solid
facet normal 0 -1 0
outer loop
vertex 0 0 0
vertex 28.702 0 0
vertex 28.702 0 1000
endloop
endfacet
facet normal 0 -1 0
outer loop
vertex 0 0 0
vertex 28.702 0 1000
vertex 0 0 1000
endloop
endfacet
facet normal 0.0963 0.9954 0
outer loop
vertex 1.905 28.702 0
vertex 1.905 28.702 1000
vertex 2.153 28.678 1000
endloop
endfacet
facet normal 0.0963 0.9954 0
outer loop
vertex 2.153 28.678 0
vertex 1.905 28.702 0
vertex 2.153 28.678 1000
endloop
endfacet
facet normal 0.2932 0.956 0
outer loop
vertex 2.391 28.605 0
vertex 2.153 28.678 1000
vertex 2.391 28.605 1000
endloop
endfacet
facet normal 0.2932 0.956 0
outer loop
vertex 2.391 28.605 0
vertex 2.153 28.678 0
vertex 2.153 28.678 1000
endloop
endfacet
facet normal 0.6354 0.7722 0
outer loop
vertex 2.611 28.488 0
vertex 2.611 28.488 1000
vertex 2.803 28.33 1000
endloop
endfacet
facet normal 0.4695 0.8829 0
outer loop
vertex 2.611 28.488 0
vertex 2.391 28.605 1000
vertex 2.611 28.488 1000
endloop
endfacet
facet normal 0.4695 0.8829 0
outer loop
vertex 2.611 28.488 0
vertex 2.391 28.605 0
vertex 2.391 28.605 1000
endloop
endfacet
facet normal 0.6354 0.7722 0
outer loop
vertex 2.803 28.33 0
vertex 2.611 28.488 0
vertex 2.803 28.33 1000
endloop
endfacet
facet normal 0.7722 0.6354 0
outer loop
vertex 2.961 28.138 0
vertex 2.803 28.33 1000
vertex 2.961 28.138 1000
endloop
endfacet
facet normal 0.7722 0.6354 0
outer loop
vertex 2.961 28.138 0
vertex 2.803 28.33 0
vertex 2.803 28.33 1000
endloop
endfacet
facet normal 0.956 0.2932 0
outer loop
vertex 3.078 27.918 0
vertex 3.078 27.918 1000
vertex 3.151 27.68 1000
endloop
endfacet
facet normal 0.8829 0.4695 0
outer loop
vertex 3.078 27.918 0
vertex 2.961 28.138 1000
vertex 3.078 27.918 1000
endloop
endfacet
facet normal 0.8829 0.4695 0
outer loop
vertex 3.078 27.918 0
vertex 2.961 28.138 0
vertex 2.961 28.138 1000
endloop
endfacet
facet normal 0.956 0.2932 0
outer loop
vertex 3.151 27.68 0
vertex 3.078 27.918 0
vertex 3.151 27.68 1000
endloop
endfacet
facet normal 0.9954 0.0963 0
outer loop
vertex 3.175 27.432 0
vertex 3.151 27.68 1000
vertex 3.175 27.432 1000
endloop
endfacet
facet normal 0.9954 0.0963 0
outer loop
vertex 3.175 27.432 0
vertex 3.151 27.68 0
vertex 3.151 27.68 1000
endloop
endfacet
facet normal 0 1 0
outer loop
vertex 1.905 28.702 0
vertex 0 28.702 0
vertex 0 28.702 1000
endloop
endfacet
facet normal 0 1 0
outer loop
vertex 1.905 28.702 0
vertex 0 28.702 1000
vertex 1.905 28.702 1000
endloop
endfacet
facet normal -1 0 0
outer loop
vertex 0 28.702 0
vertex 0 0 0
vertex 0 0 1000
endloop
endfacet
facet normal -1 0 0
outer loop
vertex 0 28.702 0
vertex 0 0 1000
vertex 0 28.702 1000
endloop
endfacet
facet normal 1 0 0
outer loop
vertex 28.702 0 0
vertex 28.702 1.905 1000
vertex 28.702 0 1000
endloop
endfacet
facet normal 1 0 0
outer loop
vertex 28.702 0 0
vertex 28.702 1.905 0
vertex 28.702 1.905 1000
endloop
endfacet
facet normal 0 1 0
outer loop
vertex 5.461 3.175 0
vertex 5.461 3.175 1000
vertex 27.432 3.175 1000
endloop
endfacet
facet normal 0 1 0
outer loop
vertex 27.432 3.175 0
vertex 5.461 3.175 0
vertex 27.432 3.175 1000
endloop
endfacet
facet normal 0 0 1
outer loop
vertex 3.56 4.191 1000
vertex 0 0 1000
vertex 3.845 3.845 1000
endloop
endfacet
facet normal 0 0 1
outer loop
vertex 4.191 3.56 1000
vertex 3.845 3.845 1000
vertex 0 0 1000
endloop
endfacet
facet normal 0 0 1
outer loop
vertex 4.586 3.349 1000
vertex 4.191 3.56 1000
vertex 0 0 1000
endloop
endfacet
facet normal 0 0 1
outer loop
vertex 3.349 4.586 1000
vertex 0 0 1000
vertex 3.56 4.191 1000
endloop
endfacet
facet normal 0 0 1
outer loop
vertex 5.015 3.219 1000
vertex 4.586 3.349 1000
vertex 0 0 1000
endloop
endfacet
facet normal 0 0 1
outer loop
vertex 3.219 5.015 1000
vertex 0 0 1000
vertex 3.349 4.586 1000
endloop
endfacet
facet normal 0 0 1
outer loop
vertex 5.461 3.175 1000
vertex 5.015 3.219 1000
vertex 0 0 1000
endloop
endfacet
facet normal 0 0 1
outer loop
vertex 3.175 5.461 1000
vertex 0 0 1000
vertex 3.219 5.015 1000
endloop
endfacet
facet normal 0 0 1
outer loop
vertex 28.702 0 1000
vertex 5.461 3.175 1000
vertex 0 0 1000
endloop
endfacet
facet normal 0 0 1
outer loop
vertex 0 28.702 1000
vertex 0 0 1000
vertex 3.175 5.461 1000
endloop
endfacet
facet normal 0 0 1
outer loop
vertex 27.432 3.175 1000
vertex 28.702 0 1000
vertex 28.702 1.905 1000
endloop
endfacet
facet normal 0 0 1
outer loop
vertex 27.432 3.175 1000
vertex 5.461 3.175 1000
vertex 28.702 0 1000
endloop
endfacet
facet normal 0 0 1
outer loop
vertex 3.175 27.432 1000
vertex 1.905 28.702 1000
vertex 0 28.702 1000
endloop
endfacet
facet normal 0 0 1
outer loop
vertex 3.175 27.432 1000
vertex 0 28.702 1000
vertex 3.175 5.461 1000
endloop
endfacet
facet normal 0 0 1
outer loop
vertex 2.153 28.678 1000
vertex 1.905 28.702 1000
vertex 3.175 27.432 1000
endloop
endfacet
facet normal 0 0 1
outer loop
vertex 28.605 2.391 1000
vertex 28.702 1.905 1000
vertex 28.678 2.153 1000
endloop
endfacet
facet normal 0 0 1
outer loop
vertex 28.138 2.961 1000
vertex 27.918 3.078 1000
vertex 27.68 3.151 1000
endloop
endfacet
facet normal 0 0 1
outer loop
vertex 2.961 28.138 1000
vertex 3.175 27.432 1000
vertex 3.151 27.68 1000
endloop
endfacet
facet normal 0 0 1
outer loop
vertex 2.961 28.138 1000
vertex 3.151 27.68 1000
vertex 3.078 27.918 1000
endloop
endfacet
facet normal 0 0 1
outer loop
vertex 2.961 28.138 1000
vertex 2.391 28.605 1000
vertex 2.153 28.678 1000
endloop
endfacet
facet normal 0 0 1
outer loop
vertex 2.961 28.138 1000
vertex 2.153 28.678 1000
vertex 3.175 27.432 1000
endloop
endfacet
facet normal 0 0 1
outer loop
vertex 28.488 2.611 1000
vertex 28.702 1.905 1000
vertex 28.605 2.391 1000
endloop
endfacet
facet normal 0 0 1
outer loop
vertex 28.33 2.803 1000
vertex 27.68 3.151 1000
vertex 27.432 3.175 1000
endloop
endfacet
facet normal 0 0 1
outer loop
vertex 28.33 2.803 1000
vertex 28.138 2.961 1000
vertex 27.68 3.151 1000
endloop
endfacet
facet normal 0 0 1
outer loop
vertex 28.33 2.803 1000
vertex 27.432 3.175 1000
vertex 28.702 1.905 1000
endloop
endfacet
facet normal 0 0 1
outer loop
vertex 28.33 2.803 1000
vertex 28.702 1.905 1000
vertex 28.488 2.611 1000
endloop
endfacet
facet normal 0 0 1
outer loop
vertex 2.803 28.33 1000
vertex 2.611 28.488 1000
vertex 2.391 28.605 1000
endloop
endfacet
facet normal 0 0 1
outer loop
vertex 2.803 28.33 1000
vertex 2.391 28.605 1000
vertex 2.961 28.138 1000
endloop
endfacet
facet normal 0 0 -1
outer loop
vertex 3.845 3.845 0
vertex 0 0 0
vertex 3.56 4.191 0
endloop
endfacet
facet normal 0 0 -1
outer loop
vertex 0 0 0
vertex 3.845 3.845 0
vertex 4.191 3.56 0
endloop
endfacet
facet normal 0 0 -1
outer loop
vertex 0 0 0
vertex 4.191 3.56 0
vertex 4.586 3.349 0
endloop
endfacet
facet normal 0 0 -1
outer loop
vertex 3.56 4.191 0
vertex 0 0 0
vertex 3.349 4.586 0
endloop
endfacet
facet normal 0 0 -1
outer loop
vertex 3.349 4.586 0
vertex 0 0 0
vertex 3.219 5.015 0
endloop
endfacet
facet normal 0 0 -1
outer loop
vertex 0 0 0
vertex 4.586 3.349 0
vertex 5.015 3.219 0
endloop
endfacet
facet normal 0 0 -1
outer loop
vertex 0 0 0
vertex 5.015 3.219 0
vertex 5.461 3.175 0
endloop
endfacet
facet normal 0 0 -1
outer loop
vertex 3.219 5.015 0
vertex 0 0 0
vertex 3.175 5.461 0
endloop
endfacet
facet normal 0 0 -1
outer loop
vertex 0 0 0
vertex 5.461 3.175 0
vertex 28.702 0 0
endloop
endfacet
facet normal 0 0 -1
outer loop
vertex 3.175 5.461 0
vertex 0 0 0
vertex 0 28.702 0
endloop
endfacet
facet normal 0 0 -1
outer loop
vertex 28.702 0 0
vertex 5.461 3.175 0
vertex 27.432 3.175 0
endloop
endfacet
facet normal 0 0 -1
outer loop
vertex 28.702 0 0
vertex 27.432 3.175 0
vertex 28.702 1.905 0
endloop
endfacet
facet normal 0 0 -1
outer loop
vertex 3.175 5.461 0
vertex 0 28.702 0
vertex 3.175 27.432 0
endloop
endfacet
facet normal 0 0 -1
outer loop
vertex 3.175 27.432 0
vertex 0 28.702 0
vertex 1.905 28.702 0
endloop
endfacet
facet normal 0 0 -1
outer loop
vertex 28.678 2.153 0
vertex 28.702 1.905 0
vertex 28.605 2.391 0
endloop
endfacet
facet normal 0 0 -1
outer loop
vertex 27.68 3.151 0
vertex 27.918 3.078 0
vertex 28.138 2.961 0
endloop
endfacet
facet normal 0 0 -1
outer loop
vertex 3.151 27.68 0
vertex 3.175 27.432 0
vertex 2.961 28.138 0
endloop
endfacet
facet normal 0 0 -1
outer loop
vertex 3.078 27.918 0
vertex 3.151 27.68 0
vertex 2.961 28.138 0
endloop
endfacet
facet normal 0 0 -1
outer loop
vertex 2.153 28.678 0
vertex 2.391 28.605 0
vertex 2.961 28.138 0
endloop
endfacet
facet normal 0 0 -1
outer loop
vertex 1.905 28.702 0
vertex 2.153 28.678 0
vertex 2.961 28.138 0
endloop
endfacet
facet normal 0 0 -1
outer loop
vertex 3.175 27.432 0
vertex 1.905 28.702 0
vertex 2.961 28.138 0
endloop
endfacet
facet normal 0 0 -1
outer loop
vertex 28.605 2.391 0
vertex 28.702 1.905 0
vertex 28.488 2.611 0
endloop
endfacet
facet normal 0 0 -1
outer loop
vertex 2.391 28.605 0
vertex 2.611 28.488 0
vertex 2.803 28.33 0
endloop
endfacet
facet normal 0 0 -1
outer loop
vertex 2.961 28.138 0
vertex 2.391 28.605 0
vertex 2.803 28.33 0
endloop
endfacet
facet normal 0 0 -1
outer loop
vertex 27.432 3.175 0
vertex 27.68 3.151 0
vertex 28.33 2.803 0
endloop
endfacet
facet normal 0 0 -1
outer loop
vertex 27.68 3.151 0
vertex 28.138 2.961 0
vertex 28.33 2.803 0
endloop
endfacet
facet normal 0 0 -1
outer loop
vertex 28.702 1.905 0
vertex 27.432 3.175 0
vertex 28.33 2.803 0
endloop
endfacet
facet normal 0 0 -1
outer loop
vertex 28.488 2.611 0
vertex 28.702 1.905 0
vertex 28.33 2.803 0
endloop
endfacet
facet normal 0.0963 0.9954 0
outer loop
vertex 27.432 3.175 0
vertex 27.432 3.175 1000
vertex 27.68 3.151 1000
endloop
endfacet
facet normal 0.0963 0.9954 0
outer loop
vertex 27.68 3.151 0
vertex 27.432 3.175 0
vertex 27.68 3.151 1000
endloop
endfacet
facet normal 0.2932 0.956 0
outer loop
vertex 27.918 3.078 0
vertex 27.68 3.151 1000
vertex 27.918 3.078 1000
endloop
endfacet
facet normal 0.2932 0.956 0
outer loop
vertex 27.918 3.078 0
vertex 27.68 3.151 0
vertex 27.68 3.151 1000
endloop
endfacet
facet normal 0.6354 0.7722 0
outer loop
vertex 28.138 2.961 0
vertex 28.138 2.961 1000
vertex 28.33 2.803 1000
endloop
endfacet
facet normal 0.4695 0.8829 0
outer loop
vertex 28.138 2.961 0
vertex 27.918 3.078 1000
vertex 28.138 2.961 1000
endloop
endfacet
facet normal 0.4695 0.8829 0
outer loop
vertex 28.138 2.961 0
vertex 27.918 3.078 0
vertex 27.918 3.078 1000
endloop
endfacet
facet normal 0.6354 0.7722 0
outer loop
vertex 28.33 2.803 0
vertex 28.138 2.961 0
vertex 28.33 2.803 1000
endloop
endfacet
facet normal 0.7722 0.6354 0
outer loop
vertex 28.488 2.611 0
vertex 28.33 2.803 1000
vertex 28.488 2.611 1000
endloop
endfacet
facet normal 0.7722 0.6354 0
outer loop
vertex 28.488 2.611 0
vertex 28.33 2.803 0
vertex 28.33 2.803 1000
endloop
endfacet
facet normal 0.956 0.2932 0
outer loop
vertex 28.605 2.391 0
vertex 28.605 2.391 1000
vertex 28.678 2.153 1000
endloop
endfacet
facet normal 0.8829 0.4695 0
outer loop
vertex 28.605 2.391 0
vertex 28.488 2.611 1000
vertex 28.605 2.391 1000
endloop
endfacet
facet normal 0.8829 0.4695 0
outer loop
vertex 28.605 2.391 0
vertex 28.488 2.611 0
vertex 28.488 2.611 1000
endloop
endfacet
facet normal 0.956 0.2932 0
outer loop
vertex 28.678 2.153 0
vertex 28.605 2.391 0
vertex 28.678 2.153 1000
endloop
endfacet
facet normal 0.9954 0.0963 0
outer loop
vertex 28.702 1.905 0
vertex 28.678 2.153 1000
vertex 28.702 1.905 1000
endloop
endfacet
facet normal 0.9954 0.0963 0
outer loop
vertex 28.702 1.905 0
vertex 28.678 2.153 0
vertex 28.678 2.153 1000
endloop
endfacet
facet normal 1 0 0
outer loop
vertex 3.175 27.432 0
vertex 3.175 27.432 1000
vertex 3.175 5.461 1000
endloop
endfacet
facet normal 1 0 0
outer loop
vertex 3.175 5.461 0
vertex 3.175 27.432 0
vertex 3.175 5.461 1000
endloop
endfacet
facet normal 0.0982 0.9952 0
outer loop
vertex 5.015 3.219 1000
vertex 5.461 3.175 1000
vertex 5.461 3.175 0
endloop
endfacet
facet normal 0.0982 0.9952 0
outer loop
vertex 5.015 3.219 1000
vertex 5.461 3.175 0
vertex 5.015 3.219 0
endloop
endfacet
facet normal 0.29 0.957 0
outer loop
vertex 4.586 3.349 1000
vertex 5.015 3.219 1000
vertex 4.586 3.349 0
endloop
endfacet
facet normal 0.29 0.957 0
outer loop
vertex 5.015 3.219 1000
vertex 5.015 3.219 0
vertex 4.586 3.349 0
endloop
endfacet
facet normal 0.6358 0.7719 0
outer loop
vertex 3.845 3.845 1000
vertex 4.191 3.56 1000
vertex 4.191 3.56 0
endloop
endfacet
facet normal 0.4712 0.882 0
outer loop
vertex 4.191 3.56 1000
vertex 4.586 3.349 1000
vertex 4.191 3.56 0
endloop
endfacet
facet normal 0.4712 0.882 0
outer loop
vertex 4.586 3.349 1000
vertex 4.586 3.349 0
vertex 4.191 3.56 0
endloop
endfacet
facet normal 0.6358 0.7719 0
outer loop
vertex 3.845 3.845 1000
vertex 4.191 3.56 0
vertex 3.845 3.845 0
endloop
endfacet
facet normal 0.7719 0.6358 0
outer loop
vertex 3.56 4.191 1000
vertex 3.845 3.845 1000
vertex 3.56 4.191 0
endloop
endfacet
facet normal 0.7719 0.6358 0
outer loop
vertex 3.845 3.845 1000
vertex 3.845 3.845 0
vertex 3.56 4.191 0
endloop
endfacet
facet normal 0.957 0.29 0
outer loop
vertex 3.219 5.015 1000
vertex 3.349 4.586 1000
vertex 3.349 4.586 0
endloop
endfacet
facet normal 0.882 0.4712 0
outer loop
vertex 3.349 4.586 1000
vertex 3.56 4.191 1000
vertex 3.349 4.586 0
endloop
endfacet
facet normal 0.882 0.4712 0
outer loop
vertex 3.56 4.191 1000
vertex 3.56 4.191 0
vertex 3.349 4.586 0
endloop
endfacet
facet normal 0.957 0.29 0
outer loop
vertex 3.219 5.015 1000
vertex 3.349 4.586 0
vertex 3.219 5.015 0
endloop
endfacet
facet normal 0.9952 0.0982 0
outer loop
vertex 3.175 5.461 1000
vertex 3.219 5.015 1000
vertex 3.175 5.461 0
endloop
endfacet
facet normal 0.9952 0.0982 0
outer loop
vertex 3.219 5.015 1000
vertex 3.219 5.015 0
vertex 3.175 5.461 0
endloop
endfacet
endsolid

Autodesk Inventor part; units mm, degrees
ref_plane "YZ Plane" through (0, 0, 0) normal (1, 0, 0) x (0, 1, 0)
ref_plane "Start Plane" through (0, 0, 0) normal (0, 0, 1) x (1, 0, 0)
ref_plane "End Plane" through (0, 0, 1000) normal (0, 0, 1) x (1, 0, 0)
sketch "Sketch" plane through (0, 0, 0) normal (0, 0, 1) x (1, 0, 0)
  line L0 (28.702, 0) -> (0, 0)
  line L1 (0, 0) -> (0, 28.702)
  line L2 (0, 28.702) -> (1.905, 28.702)
  line L3 (3.175, 27.432) -> (3.175, 5.461)
  line L4 (5.461, 3.175) -> (27.432, 3.175)
  line L5 (28.702, 1.905) -> (28.702, 0)
  line L6 (0, -11.0414) -> (0, 31.5385) construction
  line L7 (-11.0414, 0) -> (31.5385, 0) construction
  arc A0 (3.175, 5.461) -> (5.461, 3.175) centre (5.461, 5.461) ccw
  arc A1 (3.175, 27.432) -> (1.905, 28.702) centre (1.905, 27.432) ccw
  arc A2 (28.702, 1.905) -> (27.432, 3.175) centre (27.432, 1.905) ccw
  line L8 (0, 40.0545) -> (0, -19.5574) construction
  line L9 (-19.5574, 0) -> (40.0545, 0) construction
  point P0 (3.175, 28.702)
  point P1 (3.175, 3.175)
  point P2 (28.702, 3.175)
  dimension "d0" = 28.702
  dimension "d1" = 28.702
  dimension "d2" = 3.175
  dimension "d3" = 3.175
  dimension "d10" = 0
  dimension "d11" = 0
  dimension "d14" = 2.286
  dimension "d15" = 1.27
extrude "Body" add sketch "Sketch" along normal up to surface (1000 mm away) from surface at 0
sketch "Sketch3" plane through (0, 0, 0) normal (0, 0, 1) x (1, 0, 0)
  line L0 (0, 0) -> (10, 0)
ref_plane "Work Plane3" through (0, 0, 0) normal (0, -1, 0) x (1, 0, 0)
sketch "Sketch4" plane through (0, 0, 0) normal (0, -1, 0) x (1, 0, 0)
  line L0 (-2, 0) -> (12, 0) projected
  line L1 (-2, 1000) -> (12, 1000) projected
  dimension "d17" = 1000
equation "\"d0\" = G_H"
equation "\"d1\" = G_H"
equation "\"d2\" = G_T"
equation "\"d3\" = G_T"
equation "\"d14\" = G_IR"
equation "\"d15\" = G_ER"
equation "\"d4\" = G_L"
equation "\"G_H\" = 28.702"
equation "\"G_T\" = 3.175"
equation "\"G_ER\" = 1.27"
equation "\"G_IR\" = 2.286"
equation "\"G_L\" = d17"
equation "\"ex\" = 0"
equation "\"G_OFFSET_START\" = 0"
equation "\"G_OFFSET_END\" = 0"
properties part number "AISC - L 1.13 x 1.13 x 1/8 - 39.37" material "Steel, Mild"
